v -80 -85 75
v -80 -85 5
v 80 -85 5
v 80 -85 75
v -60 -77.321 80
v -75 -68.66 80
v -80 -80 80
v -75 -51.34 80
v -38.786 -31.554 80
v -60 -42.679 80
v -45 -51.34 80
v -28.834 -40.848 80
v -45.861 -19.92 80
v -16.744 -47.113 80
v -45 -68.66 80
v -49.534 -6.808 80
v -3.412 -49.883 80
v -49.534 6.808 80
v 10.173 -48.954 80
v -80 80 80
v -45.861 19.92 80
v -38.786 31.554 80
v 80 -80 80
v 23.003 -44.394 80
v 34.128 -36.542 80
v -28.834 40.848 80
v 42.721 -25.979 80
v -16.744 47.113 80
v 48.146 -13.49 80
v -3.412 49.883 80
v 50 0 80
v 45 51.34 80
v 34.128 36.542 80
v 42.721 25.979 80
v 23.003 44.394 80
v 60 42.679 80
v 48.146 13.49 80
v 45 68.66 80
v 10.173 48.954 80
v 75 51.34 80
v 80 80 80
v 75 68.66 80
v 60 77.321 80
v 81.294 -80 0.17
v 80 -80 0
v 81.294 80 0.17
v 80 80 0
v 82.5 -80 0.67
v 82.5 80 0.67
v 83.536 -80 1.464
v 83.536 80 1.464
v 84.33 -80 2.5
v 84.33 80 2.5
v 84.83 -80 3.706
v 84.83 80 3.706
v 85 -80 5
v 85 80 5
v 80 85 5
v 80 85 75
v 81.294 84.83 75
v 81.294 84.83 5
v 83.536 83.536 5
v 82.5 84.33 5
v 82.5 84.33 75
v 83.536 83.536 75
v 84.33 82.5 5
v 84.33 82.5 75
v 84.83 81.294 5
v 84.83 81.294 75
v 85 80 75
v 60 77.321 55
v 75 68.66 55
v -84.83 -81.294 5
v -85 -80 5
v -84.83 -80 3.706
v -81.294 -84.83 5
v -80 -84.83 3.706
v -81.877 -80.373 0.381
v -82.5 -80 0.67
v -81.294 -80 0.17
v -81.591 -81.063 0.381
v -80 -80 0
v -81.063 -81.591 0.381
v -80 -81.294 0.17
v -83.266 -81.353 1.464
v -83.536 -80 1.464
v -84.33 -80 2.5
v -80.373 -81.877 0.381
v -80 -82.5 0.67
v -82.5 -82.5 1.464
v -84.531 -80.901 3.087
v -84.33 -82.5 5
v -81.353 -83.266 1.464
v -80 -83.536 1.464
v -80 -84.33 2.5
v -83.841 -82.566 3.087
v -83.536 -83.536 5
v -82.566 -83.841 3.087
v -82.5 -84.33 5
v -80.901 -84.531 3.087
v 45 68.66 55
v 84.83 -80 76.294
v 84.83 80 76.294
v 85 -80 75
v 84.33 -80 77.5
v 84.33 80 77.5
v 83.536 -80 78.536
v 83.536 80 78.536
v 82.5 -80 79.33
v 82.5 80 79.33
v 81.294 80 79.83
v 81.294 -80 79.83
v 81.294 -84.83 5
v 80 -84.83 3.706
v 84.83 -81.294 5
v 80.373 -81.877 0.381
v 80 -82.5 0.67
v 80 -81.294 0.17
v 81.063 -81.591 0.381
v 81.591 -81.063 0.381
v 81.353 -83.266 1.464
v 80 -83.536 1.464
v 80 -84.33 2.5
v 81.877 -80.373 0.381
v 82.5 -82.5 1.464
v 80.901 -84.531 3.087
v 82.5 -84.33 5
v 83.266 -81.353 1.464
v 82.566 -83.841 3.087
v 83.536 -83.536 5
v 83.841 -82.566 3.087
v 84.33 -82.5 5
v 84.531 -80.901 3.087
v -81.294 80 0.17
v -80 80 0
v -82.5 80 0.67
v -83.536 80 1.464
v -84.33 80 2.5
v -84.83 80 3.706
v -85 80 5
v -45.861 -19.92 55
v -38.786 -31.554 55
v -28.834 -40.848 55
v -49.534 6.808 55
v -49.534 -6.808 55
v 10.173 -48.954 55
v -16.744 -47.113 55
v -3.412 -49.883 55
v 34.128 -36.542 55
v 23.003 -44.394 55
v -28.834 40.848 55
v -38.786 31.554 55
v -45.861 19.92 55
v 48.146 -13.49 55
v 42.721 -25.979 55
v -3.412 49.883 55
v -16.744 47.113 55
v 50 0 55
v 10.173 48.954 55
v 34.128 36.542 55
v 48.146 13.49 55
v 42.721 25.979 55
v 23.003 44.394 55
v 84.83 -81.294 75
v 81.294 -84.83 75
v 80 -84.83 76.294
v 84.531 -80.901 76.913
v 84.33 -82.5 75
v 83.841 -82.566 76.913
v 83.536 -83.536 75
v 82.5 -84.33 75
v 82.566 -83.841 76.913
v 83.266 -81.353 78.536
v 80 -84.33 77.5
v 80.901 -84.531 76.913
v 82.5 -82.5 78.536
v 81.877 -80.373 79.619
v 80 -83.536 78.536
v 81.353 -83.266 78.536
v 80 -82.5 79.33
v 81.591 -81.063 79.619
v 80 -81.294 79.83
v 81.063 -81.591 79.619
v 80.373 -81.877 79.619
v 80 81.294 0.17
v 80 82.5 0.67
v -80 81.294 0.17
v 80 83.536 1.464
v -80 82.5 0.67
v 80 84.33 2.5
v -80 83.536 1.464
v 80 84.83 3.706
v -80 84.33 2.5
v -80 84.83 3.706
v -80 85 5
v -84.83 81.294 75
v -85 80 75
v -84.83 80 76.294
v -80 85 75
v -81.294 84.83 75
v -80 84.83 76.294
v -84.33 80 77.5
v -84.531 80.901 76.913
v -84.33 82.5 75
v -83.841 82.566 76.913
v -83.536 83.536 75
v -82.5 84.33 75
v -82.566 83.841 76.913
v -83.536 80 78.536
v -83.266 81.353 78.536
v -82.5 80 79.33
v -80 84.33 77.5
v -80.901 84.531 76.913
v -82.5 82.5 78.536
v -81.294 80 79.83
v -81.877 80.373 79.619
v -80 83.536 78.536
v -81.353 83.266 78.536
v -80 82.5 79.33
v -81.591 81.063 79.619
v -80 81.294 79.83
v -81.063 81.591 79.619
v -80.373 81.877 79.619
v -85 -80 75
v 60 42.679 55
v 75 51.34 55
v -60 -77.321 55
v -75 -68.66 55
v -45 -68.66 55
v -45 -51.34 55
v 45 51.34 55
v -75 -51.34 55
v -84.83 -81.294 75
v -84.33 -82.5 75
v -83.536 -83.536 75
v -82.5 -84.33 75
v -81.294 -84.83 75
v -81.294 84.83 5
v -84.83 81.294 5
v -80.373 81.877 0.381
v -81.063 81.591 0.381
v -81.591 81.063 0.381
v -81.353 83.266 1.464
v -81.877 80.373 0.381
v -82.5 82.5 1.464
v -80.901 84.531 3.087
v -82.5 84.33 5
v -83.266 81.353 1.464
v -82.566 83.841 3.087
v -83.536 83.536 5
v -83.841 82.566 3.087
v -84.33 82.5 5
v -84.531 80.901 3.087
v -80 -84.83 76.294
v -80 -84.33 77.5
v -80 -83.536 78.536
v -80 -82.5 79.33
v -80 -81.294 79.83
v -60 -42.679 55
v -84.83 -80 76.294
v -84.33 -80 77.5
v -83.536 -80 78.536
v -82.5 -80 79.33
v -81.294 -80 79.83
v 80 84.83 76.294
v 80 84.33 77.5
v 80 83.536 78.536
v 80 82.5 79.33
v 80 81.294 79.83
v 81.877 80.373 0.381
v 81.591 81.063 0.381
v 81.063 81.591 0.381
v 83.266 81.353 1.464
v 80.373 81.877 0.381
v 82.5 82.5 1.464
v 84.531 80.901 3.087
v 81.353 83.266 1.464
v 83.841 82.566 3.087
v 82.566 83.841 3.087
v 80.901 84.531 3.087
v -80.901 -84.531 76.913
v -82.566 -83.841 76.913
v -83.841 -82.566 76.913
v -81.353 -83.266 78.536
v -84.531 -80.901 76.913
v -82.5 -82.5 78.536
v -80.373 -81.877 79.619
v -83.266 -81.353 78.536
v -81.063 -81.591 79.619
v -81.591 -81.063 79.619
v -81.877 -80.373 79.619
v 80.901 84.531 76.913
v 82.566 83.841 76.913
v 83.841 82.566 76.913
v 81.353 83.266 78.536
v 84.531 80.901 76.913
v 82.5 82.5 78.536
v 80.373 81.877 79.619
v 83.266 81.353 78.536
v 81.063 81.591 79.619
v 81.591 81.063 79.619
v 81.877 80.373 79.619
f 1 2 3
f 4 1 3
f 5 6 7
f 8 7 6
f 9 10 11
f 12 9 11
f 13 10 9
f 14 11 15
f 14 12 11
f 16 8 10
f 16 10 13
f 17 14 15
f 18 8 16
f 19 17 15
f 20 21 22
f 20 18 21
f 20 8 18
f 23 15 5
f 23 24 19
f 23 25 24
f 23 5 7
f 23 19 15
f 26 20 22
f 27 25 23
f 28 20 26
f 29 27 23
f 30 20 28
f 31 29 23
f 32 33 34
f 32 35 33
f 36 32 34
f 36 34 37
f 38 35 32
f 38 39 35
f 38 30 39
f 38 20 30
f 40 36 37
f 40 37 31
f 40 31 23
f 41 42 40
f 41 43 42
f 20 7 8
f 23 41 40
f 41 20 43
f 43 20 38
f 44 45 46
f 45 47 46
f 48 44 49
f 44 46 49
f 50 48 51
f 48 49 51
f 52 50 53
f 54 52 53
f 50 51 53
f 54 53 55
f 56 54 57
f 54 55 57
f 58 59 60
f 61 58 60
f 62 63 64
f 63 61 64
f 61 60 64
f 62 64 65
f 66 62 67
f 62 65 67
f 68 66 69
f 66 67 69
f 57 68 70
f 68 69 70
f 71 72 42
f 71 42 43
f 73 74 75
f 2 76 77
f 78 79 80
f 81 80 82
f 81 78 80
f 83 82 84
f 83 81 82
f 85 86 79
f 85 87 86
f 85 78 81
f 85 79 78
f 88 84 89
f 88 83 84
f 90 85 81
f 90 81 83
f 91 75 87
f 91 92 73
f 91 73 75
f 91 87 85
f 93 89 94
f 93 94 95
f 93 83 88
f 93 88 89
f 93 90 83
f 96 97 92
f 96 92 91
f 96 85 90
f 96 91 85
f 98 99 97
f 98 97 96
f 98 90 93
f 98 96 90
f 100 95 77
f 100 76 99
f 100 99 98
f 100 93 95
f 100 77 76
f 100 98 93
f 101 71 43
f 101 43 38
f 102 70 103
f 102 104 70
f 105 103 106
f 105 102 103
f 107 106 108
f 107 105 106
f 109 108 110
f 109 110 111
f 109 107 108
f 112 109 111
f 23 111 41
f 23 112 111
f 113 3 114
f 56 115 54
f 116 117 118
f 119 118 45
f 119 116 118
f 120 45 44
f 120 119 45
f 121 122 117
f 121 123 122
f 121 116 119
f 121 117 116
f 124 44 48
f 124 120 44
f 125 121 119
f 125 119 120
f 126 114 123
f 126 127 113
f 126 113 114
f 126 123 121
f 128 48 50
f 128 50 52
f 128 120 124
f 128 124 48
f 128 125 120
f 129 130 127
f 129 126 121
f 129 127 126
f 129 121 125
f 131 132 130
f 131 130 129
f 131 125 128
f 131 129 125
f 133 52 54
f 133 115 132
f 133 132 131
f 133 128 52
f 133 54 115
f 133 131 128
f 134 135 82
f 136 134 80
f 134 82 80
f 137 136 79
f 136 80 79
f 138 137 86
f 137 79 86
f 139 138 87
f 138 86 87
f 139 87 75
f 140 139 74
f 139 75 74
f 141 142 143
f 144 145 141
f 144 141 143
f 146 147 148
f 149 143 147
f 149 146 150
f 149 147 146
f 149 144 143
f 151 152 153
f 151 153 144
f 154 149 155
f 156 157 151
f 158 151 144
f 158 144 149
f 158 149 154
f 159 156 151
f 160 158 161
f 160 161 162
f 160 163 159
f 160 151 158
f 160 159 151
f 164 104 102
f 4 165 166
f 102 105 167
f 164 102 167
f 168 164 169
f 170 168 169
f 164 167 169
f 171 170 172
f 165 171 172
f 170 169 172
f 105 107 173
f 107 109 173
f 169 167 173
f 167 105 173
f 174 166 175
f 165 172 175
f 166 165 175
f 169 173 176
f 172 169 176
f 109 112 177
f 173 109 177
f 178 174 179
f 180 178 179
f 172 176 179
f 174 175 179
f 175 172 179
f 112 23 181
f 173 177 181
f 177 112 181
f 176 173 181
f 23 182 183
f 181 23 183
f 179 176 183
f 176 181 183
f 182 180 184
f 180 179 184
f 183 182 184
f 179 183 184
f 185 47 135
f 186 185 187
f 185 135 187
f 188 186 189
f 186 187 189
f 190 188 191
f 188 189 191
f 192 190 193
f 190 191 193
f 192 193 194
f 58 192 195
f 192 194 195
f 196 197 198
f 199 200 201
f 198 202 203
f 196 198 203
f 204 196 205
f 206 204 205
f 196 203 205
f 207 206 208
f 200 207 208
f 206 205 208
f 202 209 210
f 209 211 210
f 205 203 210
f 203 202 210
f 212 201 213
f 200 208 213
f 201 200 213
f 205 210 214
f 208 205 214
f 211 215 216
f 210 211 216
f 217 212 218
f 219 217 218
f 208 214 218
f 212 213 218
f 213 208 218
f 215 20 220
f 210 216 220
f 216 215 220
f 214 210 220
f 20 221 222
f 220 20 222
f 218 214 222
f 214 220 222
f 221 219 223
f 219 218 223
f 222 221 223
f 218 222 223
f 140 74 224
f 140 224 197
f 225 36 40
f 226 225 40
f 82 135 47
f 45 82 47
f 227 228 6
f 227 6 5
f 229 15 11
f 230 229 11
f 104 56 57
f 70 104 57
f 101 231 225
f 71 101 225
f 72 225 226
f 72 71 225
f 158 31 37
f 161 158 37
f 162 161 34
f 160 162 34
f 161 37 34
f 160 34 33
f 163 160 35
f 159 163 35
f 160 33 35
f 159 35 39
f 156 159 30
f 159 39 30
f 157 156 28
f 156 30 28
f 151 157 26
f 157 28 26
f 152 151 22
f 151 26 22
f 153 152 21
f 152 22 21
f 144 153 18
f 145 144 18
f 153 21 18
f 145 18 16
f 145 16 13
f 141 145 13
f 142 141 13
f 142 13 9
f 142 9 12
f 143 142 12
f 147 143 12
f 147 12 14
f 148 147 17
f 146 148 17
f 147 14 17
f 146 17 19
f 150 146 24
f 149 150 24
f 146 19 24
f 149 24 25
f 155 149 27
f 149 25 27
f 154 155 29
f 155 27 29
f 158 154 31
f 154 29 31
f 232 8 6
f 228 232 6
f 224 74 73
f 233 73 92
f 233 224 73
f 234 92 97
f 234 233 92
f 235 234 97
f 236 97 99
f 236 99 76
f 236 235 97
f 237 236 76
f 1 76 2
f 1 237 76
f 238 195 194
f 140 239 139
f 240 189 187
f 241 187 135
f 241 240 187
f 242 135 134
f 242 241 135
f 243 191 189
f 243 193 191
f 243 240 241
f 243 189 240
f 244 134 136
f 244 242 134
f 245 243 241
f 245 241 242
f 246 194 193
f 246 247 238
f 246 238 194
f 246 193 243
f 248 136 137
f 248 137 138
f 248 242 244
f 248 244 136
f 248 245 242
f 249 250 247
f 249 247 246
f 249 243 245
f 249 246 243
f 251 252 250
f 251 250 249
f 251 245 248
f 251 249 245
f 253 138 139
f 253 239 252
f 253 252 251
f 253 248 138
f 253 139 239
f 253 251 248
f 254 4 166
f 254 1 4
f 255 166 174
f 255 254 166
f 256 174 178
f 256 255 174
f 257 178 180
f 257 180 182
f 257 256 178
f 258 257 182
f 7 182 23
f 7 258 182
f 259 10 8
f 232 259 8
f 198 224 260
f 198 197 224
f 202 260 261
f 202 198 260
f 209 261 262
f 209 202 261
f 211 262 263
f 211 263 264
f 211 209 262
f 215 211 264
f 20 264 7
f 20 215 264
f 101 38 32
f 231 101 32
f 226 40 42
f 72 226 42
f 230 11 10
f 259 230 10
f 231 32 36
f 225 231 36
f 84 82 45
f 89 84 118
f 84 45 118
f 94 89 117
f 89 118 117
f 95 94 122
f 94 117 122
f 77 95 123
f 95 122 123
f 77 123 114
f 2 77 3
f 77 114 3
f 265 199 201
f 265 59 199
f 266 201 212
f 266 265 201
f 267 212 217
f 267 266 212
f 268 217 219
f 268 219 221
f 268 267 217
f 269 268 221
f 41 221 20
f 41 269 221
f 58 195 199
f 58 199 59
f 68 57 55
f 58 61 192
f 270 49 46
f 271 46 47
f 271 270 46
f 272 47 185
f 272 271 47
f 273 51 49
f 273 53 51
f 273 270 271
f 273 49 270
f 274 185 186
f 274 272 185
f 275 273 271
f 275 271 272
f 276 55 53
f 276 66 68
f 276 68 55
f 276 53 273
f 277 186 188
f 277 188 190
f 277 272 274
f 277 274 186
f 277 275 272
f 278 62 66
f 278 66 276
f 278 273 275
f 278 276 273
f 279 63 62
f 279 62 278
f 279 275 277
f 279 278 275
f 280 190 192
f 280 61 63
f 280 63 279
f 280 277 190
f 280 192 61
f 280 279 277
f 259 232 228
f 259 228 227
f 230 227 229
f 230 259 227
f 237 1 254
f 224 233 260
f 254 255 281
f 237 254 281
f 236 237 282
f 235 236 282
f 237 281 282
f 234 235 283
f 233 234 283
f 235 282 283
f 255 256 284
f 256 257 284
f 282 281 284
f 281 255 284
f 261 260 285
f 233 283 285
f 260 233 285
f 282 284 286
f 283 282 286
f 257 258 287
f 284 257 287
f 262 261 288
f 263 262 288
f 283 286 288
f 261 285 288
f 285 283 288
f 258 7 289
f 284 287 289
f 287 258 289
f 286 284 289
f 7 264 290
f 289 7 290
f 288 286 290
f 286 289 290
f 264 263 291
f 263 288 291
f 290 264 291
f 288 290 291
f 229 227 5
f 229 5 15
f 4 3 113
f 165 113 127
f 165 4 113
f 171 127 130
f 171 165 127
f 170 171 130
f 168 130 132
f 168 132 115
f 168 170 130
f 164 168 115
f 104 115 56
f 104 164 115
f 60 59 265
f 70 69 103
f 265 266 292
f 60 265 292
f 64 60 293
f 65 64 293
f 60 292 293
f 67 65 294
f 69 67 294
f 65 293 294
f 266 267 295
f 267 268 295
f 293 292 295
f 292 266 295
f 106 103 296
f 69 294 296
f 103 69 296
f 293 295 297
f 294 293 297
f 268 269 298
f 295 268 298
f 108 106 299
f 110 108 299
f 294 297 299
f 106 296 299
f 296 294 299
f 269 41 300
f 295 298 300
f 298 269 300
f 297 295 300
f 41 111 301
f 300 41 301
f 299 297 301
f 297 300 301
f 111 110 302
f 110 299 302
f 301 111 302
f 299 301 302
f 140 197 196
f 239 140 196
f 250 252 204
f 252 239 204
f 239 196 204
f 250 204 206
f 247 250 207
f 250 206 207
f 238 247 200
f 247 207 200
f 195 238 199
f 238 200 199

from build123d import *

# Parameters (mm, degrees)
F0_W     = 170
F0_H     = 170
F1_DEPTH = 80
F2_R     = 50
F3_DEPTH = 25
F4_R     = 5
F5_R     = 5


with BuildPart() as f1:
    # F0 (on Top) → F1 (new body)
    with BuildSketch(Plane.XY):
        Rectangle(F0_W, F0_H)
    extrude(amount=F1_DEPTH)

    # F2 (on face) → F3 (cut)
    with BuildSketch(Plane.XY.offset(80)):
        Circle(F2_R)
        Polygon((-75, -51.339746), (-75, -68.660254), (-60, -77.320508), (-45, -68.660254), (-45, -51.339746), (-60, -42.679492), align=None)
        Polygon((75, 51.339746), (75, 68.660254), (60, 77.320508), (45, 68.660254), (45, 51.339746), (60, 42.679492), align=None)
    extrude(amount=-F3_DEPTH, mode=Mode.SUBTRACT)

    # F4
    f4_edges = [f1.edges().sort_by_distance(p)[0] for p in [
        (85, -85, 40),
        (85, 85, 40),
        (-85, 85, 40),
        (-85, -85, 40),
    ]]
    fillet(f4_edges, radius=F4_R)

    # F5
    f5_edges = [f1.edges().sort_by_distance(p)[0] for p in [
        (-85, 0, 80),
        (85, 0, 0),
    ]]
    fillet(f5_edges, radius=F5_R)


solid = f1.part
